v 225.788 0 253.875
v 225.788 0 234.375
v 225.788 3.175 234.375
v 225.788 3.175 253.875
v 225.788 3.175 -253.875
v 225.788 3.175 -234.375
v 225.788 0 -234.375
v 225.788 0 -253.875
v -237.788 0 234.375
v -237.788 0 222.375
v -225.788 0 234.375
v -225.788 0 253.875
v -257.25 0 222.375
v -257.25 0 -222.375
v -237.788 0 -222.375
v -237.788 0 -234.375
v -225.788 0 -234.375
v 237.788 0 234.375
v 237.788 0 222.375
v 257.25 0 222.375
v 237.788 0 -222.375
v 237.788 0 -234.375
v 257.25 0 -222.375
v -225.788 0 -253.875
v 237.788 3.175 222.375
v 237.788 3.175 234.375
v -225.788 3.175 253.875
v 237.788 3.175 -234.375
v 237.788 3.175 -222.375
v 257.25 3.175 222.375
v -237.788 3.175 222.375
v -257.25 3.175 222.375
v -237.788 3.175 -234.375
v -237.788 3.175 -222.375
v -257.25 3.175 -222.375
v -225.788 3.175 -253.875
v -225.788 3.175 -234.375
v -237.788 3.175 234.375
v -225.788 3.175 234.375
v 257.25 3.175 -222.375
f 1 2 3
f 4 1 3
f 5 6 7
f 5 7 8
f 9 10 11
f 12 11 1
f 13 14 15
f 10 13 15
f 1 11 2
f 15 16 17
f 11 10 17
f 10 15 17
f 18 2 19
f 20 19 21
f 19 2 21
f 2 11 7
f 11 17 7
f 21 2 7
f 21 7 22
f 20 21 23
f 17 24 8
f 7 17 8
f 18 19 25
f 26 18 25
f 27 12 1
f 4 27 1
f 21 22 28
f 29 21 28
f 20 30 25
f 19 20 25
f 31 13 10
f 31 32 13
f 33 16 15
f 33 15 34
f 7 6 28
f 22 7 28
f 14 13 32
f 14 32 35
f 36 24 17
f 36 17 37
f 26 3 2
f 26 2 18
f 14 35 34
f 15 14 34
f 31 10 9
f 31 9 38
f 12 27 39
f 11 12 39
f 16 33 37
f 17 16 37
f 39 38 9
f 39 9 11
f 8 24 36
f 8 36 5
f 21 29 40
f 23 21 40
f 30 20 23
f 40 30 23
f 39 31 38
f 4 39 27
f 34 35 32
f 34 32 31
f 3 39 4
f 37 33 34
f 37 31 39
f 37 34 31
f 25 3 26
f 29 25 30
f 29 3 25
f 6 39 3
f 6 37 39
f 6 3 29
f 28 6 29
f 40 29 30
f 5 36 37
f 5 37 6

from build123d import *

# Parameters (mm, degrees)
SKETCH1_W           = 514.5
SKETCH1_H           = 507.75
BOSS_EXTRUDE1_DEPTH = 3.175
CAVITY1_START       = -252
CAVITY1_OUTLINE_W   = 29.625
CAVITY1_OUTLINE_H   = 3.175
CAVITY1_DEPTH       = 17.625
CAVITY1_START_2     = 222.375
CAVITY1_2_OUTLINE_W = 17.625
CAVITY1_2_OUTLINE_H = 3.175
CAVITY1_2_DEPTH     = 29.625
CAVITY1_START_3     = -234.375
CAVITY1_3_OUTLINE_W = 17.625
CAVITY1_3_OUTLINE_H = 3.175
CAVITY1_3_DEPTH     = 12
CAVITY1_START_4     = 234.375
CAVITY1_4_OUTLINE_W = 12
CAVITY1_4_OUTLINE_H = 3.175
CAVITY1_4_DEPTH     = 17.625
CAVITY1_5_OUTLINE_W = 1.8375
CAVITY1_5_OUTLINE_H = 3.175
CAVITY1_5_DEPTH     = 14.625
CAVITY1_START_5     = 237.375
CAVITY1_6_OUTLINE_W = 1.8375
CAVITY1_6_OUTLINE_H = 3.175
CAVITY1_6_DEPTH     = 14.625
SKETCH2_W           = 12
SKETCH2_H           = 19.5
CUT_EXTRUDE1_DEPTH  = 362.441777815


# Read off the part's stored shape, not the designer's step: Cavity1
with BuildPart() as part:
    # Sketch1 → Boss-Extrude1 (new body)
    with BuildSketch(Plane(origin=(0, 0, 0), x_dir=(1, 0, 0), z_dir=(0, 1, 0))):
        Rectangle(SKETCH1_W, SKETCH1_H)
    extrude(amount=BOSS_EXTRUDE1_DEPTH)

    # Cavity1 outline → Cavity1 (cut)
    with BuildSketch(Plane.XY.offset(CAVITY1_START)):
        with Locations((-240.6, 1.5875)):
            Rectangle(CAVITY1_OUTLINE_W, CAVITY1_OUTLINE_H)
        with Locations((240.6, 1.5875)):
            Rectangle(CAVITY1_OUTLINE_W, CAVITY1_OUTLINE_H)
    extrude(amount=CAVITY1_DEPTH, mode=Mode.SUBTRACT)

    # Cavity1 2 outline → Cavity1 2 (cut)
    with BuildSketch(Plane.XY.offset(CAVITY1_START_2)):
        with Locations((-246.6, 1.5875)):
            Rectangle(CAVITY1_2_OUTLINE_W, CAVITY1_2_OUTLINE_H)
        with Locations((246.6, 1.5875)):
            Rectangle(CAVITY1_2_OUTLINE_W, CAVITY1_2_OUTLINE_H)
    extrude(amount=CAVITY1_2_DEPTH, mode=Mode.SUBTRACT)

    # Cavity1 3 outline → Cavity1 3 (cut)
    with BuildSketch(Plane.XY.offset(CAVITY1_START_3)):
        with Locations((-246.6, 1.5875)):
            Rectangle(CAVITY1_3_OUTLINE_W, CAVITY1_3_OUTLINE_H)
        with Locations((246.6, 1.5875)):
            Rectangle(CAVITY1_3_OUTLINE_W, CAVITY1_3_OUTLINE_H)
    extrude(amount=CAVITY1_3_DEPTH, mode=Mode.SUBTRACT)

    # Cavity1 4 outline → Cavity1 4 (cut)
    with BuildSketch(Plane.XY.offset(CAVITY1_START_4)):
        with Locations((-231.7875, 1.5875)):
            Rectangle(CAVITY1_4_OUTLINE_W, CAVITY1_4_OUTLINE_H)
        with Locations((231.7875, 1.5875)):
            Rectangle(CAVITY1_4_OUTLINE_W, CAVITY1_4_OUTLINE_H)
    extrude(amount=CAVITY1_4_DEPTH, mode=Mode.SUBTRACT)

    # Cavity1 5 outline → Cavity1 5 (cut)
    with BuildSketch(Plane.XY.offset(CAVITY1_START)):
        with Locations((-256.33125, 1.5875)):
            Rectangle(CAVITY1_5_OUTLINE_W, CAVITY1_5_OUTLINE_H)
        with Locations((256.33125, 1.5875)):
            Rectangle(CAVITY1_5_OUTLINE_W, CAVITY1_5_OUTLINE_H)
    extrude(amount=CAVITY1_5_DEPTH, mode=Mode.SUBTRACT)

    # Cavity1 6 outline → Cavity1 6 (cut)
    with BuildSketch(Plane.XY.offset(CAVITY1_START_5)):
        with Locations((-256.33125, 1.5875)):
            Rectangle(CAVITY1_6_OUTLINE_W, CAVITY1_6_OUTLINE_H)
        with Locations((256.33125, 1.5875)):
            Rectangle(CAVITY1_6_OUTLINE_W, CAVITY1_6_OUTLINE_H)
    extrude(amount=CAVITY1_6_DEPTH, mode=Mode.SUBTRACT)

    # Sketch2 → Cut-Extrude1 (cut, through all)
    with BuildSketch(Plane(origin=(0, 3.175, 0), x_dir=(1, 0, 0), z_dir=(0, 1, 0))):
        Polygon((-237.7875, -234.375), (-237.7875, -222.375), (-257.25, -222.375), (-257.25, -253.875), (-237.7875, -253.875), align=None)
        with Locations((-231.7875, -244.125)):
            Rectangle(SKETCH2_W, SKETCH2_H)
        Polygon((257.25, -222.375), (237.7875, -222.375), (237.7875, -234.375), (237.7875, -253.875), (257.25, -253.875), align=None)
        with Locations((231.7875, -244.125)):
            Rectangle(SKETCH2_W, SKETCH2_H)
        Polygon((237.7875, 234.375), (237.7875, 222.375), (257.25, 222.375), (257.25, 253.875), (237.7875, 253.875), align=None)
        with Locations((231.7875, 244.125)):
            Rectangle(SKETCH2_W, SKETCH2_H)
        Polygon((-257.25, 222.375), (-237.7875, 222.375), (-237.7875, 234.375), (-237.7875, 253.875), (-257.25, 253.875), align=None)
        with Locations((-231.7875, 244.125)):
            Rectangle(SKETCH2_W, SKETCH2_H)
    extrude(amount=-CUT_EXTRUDE1_DEPTH, mode=Mode.SUBTRACT)


solid = part.part
